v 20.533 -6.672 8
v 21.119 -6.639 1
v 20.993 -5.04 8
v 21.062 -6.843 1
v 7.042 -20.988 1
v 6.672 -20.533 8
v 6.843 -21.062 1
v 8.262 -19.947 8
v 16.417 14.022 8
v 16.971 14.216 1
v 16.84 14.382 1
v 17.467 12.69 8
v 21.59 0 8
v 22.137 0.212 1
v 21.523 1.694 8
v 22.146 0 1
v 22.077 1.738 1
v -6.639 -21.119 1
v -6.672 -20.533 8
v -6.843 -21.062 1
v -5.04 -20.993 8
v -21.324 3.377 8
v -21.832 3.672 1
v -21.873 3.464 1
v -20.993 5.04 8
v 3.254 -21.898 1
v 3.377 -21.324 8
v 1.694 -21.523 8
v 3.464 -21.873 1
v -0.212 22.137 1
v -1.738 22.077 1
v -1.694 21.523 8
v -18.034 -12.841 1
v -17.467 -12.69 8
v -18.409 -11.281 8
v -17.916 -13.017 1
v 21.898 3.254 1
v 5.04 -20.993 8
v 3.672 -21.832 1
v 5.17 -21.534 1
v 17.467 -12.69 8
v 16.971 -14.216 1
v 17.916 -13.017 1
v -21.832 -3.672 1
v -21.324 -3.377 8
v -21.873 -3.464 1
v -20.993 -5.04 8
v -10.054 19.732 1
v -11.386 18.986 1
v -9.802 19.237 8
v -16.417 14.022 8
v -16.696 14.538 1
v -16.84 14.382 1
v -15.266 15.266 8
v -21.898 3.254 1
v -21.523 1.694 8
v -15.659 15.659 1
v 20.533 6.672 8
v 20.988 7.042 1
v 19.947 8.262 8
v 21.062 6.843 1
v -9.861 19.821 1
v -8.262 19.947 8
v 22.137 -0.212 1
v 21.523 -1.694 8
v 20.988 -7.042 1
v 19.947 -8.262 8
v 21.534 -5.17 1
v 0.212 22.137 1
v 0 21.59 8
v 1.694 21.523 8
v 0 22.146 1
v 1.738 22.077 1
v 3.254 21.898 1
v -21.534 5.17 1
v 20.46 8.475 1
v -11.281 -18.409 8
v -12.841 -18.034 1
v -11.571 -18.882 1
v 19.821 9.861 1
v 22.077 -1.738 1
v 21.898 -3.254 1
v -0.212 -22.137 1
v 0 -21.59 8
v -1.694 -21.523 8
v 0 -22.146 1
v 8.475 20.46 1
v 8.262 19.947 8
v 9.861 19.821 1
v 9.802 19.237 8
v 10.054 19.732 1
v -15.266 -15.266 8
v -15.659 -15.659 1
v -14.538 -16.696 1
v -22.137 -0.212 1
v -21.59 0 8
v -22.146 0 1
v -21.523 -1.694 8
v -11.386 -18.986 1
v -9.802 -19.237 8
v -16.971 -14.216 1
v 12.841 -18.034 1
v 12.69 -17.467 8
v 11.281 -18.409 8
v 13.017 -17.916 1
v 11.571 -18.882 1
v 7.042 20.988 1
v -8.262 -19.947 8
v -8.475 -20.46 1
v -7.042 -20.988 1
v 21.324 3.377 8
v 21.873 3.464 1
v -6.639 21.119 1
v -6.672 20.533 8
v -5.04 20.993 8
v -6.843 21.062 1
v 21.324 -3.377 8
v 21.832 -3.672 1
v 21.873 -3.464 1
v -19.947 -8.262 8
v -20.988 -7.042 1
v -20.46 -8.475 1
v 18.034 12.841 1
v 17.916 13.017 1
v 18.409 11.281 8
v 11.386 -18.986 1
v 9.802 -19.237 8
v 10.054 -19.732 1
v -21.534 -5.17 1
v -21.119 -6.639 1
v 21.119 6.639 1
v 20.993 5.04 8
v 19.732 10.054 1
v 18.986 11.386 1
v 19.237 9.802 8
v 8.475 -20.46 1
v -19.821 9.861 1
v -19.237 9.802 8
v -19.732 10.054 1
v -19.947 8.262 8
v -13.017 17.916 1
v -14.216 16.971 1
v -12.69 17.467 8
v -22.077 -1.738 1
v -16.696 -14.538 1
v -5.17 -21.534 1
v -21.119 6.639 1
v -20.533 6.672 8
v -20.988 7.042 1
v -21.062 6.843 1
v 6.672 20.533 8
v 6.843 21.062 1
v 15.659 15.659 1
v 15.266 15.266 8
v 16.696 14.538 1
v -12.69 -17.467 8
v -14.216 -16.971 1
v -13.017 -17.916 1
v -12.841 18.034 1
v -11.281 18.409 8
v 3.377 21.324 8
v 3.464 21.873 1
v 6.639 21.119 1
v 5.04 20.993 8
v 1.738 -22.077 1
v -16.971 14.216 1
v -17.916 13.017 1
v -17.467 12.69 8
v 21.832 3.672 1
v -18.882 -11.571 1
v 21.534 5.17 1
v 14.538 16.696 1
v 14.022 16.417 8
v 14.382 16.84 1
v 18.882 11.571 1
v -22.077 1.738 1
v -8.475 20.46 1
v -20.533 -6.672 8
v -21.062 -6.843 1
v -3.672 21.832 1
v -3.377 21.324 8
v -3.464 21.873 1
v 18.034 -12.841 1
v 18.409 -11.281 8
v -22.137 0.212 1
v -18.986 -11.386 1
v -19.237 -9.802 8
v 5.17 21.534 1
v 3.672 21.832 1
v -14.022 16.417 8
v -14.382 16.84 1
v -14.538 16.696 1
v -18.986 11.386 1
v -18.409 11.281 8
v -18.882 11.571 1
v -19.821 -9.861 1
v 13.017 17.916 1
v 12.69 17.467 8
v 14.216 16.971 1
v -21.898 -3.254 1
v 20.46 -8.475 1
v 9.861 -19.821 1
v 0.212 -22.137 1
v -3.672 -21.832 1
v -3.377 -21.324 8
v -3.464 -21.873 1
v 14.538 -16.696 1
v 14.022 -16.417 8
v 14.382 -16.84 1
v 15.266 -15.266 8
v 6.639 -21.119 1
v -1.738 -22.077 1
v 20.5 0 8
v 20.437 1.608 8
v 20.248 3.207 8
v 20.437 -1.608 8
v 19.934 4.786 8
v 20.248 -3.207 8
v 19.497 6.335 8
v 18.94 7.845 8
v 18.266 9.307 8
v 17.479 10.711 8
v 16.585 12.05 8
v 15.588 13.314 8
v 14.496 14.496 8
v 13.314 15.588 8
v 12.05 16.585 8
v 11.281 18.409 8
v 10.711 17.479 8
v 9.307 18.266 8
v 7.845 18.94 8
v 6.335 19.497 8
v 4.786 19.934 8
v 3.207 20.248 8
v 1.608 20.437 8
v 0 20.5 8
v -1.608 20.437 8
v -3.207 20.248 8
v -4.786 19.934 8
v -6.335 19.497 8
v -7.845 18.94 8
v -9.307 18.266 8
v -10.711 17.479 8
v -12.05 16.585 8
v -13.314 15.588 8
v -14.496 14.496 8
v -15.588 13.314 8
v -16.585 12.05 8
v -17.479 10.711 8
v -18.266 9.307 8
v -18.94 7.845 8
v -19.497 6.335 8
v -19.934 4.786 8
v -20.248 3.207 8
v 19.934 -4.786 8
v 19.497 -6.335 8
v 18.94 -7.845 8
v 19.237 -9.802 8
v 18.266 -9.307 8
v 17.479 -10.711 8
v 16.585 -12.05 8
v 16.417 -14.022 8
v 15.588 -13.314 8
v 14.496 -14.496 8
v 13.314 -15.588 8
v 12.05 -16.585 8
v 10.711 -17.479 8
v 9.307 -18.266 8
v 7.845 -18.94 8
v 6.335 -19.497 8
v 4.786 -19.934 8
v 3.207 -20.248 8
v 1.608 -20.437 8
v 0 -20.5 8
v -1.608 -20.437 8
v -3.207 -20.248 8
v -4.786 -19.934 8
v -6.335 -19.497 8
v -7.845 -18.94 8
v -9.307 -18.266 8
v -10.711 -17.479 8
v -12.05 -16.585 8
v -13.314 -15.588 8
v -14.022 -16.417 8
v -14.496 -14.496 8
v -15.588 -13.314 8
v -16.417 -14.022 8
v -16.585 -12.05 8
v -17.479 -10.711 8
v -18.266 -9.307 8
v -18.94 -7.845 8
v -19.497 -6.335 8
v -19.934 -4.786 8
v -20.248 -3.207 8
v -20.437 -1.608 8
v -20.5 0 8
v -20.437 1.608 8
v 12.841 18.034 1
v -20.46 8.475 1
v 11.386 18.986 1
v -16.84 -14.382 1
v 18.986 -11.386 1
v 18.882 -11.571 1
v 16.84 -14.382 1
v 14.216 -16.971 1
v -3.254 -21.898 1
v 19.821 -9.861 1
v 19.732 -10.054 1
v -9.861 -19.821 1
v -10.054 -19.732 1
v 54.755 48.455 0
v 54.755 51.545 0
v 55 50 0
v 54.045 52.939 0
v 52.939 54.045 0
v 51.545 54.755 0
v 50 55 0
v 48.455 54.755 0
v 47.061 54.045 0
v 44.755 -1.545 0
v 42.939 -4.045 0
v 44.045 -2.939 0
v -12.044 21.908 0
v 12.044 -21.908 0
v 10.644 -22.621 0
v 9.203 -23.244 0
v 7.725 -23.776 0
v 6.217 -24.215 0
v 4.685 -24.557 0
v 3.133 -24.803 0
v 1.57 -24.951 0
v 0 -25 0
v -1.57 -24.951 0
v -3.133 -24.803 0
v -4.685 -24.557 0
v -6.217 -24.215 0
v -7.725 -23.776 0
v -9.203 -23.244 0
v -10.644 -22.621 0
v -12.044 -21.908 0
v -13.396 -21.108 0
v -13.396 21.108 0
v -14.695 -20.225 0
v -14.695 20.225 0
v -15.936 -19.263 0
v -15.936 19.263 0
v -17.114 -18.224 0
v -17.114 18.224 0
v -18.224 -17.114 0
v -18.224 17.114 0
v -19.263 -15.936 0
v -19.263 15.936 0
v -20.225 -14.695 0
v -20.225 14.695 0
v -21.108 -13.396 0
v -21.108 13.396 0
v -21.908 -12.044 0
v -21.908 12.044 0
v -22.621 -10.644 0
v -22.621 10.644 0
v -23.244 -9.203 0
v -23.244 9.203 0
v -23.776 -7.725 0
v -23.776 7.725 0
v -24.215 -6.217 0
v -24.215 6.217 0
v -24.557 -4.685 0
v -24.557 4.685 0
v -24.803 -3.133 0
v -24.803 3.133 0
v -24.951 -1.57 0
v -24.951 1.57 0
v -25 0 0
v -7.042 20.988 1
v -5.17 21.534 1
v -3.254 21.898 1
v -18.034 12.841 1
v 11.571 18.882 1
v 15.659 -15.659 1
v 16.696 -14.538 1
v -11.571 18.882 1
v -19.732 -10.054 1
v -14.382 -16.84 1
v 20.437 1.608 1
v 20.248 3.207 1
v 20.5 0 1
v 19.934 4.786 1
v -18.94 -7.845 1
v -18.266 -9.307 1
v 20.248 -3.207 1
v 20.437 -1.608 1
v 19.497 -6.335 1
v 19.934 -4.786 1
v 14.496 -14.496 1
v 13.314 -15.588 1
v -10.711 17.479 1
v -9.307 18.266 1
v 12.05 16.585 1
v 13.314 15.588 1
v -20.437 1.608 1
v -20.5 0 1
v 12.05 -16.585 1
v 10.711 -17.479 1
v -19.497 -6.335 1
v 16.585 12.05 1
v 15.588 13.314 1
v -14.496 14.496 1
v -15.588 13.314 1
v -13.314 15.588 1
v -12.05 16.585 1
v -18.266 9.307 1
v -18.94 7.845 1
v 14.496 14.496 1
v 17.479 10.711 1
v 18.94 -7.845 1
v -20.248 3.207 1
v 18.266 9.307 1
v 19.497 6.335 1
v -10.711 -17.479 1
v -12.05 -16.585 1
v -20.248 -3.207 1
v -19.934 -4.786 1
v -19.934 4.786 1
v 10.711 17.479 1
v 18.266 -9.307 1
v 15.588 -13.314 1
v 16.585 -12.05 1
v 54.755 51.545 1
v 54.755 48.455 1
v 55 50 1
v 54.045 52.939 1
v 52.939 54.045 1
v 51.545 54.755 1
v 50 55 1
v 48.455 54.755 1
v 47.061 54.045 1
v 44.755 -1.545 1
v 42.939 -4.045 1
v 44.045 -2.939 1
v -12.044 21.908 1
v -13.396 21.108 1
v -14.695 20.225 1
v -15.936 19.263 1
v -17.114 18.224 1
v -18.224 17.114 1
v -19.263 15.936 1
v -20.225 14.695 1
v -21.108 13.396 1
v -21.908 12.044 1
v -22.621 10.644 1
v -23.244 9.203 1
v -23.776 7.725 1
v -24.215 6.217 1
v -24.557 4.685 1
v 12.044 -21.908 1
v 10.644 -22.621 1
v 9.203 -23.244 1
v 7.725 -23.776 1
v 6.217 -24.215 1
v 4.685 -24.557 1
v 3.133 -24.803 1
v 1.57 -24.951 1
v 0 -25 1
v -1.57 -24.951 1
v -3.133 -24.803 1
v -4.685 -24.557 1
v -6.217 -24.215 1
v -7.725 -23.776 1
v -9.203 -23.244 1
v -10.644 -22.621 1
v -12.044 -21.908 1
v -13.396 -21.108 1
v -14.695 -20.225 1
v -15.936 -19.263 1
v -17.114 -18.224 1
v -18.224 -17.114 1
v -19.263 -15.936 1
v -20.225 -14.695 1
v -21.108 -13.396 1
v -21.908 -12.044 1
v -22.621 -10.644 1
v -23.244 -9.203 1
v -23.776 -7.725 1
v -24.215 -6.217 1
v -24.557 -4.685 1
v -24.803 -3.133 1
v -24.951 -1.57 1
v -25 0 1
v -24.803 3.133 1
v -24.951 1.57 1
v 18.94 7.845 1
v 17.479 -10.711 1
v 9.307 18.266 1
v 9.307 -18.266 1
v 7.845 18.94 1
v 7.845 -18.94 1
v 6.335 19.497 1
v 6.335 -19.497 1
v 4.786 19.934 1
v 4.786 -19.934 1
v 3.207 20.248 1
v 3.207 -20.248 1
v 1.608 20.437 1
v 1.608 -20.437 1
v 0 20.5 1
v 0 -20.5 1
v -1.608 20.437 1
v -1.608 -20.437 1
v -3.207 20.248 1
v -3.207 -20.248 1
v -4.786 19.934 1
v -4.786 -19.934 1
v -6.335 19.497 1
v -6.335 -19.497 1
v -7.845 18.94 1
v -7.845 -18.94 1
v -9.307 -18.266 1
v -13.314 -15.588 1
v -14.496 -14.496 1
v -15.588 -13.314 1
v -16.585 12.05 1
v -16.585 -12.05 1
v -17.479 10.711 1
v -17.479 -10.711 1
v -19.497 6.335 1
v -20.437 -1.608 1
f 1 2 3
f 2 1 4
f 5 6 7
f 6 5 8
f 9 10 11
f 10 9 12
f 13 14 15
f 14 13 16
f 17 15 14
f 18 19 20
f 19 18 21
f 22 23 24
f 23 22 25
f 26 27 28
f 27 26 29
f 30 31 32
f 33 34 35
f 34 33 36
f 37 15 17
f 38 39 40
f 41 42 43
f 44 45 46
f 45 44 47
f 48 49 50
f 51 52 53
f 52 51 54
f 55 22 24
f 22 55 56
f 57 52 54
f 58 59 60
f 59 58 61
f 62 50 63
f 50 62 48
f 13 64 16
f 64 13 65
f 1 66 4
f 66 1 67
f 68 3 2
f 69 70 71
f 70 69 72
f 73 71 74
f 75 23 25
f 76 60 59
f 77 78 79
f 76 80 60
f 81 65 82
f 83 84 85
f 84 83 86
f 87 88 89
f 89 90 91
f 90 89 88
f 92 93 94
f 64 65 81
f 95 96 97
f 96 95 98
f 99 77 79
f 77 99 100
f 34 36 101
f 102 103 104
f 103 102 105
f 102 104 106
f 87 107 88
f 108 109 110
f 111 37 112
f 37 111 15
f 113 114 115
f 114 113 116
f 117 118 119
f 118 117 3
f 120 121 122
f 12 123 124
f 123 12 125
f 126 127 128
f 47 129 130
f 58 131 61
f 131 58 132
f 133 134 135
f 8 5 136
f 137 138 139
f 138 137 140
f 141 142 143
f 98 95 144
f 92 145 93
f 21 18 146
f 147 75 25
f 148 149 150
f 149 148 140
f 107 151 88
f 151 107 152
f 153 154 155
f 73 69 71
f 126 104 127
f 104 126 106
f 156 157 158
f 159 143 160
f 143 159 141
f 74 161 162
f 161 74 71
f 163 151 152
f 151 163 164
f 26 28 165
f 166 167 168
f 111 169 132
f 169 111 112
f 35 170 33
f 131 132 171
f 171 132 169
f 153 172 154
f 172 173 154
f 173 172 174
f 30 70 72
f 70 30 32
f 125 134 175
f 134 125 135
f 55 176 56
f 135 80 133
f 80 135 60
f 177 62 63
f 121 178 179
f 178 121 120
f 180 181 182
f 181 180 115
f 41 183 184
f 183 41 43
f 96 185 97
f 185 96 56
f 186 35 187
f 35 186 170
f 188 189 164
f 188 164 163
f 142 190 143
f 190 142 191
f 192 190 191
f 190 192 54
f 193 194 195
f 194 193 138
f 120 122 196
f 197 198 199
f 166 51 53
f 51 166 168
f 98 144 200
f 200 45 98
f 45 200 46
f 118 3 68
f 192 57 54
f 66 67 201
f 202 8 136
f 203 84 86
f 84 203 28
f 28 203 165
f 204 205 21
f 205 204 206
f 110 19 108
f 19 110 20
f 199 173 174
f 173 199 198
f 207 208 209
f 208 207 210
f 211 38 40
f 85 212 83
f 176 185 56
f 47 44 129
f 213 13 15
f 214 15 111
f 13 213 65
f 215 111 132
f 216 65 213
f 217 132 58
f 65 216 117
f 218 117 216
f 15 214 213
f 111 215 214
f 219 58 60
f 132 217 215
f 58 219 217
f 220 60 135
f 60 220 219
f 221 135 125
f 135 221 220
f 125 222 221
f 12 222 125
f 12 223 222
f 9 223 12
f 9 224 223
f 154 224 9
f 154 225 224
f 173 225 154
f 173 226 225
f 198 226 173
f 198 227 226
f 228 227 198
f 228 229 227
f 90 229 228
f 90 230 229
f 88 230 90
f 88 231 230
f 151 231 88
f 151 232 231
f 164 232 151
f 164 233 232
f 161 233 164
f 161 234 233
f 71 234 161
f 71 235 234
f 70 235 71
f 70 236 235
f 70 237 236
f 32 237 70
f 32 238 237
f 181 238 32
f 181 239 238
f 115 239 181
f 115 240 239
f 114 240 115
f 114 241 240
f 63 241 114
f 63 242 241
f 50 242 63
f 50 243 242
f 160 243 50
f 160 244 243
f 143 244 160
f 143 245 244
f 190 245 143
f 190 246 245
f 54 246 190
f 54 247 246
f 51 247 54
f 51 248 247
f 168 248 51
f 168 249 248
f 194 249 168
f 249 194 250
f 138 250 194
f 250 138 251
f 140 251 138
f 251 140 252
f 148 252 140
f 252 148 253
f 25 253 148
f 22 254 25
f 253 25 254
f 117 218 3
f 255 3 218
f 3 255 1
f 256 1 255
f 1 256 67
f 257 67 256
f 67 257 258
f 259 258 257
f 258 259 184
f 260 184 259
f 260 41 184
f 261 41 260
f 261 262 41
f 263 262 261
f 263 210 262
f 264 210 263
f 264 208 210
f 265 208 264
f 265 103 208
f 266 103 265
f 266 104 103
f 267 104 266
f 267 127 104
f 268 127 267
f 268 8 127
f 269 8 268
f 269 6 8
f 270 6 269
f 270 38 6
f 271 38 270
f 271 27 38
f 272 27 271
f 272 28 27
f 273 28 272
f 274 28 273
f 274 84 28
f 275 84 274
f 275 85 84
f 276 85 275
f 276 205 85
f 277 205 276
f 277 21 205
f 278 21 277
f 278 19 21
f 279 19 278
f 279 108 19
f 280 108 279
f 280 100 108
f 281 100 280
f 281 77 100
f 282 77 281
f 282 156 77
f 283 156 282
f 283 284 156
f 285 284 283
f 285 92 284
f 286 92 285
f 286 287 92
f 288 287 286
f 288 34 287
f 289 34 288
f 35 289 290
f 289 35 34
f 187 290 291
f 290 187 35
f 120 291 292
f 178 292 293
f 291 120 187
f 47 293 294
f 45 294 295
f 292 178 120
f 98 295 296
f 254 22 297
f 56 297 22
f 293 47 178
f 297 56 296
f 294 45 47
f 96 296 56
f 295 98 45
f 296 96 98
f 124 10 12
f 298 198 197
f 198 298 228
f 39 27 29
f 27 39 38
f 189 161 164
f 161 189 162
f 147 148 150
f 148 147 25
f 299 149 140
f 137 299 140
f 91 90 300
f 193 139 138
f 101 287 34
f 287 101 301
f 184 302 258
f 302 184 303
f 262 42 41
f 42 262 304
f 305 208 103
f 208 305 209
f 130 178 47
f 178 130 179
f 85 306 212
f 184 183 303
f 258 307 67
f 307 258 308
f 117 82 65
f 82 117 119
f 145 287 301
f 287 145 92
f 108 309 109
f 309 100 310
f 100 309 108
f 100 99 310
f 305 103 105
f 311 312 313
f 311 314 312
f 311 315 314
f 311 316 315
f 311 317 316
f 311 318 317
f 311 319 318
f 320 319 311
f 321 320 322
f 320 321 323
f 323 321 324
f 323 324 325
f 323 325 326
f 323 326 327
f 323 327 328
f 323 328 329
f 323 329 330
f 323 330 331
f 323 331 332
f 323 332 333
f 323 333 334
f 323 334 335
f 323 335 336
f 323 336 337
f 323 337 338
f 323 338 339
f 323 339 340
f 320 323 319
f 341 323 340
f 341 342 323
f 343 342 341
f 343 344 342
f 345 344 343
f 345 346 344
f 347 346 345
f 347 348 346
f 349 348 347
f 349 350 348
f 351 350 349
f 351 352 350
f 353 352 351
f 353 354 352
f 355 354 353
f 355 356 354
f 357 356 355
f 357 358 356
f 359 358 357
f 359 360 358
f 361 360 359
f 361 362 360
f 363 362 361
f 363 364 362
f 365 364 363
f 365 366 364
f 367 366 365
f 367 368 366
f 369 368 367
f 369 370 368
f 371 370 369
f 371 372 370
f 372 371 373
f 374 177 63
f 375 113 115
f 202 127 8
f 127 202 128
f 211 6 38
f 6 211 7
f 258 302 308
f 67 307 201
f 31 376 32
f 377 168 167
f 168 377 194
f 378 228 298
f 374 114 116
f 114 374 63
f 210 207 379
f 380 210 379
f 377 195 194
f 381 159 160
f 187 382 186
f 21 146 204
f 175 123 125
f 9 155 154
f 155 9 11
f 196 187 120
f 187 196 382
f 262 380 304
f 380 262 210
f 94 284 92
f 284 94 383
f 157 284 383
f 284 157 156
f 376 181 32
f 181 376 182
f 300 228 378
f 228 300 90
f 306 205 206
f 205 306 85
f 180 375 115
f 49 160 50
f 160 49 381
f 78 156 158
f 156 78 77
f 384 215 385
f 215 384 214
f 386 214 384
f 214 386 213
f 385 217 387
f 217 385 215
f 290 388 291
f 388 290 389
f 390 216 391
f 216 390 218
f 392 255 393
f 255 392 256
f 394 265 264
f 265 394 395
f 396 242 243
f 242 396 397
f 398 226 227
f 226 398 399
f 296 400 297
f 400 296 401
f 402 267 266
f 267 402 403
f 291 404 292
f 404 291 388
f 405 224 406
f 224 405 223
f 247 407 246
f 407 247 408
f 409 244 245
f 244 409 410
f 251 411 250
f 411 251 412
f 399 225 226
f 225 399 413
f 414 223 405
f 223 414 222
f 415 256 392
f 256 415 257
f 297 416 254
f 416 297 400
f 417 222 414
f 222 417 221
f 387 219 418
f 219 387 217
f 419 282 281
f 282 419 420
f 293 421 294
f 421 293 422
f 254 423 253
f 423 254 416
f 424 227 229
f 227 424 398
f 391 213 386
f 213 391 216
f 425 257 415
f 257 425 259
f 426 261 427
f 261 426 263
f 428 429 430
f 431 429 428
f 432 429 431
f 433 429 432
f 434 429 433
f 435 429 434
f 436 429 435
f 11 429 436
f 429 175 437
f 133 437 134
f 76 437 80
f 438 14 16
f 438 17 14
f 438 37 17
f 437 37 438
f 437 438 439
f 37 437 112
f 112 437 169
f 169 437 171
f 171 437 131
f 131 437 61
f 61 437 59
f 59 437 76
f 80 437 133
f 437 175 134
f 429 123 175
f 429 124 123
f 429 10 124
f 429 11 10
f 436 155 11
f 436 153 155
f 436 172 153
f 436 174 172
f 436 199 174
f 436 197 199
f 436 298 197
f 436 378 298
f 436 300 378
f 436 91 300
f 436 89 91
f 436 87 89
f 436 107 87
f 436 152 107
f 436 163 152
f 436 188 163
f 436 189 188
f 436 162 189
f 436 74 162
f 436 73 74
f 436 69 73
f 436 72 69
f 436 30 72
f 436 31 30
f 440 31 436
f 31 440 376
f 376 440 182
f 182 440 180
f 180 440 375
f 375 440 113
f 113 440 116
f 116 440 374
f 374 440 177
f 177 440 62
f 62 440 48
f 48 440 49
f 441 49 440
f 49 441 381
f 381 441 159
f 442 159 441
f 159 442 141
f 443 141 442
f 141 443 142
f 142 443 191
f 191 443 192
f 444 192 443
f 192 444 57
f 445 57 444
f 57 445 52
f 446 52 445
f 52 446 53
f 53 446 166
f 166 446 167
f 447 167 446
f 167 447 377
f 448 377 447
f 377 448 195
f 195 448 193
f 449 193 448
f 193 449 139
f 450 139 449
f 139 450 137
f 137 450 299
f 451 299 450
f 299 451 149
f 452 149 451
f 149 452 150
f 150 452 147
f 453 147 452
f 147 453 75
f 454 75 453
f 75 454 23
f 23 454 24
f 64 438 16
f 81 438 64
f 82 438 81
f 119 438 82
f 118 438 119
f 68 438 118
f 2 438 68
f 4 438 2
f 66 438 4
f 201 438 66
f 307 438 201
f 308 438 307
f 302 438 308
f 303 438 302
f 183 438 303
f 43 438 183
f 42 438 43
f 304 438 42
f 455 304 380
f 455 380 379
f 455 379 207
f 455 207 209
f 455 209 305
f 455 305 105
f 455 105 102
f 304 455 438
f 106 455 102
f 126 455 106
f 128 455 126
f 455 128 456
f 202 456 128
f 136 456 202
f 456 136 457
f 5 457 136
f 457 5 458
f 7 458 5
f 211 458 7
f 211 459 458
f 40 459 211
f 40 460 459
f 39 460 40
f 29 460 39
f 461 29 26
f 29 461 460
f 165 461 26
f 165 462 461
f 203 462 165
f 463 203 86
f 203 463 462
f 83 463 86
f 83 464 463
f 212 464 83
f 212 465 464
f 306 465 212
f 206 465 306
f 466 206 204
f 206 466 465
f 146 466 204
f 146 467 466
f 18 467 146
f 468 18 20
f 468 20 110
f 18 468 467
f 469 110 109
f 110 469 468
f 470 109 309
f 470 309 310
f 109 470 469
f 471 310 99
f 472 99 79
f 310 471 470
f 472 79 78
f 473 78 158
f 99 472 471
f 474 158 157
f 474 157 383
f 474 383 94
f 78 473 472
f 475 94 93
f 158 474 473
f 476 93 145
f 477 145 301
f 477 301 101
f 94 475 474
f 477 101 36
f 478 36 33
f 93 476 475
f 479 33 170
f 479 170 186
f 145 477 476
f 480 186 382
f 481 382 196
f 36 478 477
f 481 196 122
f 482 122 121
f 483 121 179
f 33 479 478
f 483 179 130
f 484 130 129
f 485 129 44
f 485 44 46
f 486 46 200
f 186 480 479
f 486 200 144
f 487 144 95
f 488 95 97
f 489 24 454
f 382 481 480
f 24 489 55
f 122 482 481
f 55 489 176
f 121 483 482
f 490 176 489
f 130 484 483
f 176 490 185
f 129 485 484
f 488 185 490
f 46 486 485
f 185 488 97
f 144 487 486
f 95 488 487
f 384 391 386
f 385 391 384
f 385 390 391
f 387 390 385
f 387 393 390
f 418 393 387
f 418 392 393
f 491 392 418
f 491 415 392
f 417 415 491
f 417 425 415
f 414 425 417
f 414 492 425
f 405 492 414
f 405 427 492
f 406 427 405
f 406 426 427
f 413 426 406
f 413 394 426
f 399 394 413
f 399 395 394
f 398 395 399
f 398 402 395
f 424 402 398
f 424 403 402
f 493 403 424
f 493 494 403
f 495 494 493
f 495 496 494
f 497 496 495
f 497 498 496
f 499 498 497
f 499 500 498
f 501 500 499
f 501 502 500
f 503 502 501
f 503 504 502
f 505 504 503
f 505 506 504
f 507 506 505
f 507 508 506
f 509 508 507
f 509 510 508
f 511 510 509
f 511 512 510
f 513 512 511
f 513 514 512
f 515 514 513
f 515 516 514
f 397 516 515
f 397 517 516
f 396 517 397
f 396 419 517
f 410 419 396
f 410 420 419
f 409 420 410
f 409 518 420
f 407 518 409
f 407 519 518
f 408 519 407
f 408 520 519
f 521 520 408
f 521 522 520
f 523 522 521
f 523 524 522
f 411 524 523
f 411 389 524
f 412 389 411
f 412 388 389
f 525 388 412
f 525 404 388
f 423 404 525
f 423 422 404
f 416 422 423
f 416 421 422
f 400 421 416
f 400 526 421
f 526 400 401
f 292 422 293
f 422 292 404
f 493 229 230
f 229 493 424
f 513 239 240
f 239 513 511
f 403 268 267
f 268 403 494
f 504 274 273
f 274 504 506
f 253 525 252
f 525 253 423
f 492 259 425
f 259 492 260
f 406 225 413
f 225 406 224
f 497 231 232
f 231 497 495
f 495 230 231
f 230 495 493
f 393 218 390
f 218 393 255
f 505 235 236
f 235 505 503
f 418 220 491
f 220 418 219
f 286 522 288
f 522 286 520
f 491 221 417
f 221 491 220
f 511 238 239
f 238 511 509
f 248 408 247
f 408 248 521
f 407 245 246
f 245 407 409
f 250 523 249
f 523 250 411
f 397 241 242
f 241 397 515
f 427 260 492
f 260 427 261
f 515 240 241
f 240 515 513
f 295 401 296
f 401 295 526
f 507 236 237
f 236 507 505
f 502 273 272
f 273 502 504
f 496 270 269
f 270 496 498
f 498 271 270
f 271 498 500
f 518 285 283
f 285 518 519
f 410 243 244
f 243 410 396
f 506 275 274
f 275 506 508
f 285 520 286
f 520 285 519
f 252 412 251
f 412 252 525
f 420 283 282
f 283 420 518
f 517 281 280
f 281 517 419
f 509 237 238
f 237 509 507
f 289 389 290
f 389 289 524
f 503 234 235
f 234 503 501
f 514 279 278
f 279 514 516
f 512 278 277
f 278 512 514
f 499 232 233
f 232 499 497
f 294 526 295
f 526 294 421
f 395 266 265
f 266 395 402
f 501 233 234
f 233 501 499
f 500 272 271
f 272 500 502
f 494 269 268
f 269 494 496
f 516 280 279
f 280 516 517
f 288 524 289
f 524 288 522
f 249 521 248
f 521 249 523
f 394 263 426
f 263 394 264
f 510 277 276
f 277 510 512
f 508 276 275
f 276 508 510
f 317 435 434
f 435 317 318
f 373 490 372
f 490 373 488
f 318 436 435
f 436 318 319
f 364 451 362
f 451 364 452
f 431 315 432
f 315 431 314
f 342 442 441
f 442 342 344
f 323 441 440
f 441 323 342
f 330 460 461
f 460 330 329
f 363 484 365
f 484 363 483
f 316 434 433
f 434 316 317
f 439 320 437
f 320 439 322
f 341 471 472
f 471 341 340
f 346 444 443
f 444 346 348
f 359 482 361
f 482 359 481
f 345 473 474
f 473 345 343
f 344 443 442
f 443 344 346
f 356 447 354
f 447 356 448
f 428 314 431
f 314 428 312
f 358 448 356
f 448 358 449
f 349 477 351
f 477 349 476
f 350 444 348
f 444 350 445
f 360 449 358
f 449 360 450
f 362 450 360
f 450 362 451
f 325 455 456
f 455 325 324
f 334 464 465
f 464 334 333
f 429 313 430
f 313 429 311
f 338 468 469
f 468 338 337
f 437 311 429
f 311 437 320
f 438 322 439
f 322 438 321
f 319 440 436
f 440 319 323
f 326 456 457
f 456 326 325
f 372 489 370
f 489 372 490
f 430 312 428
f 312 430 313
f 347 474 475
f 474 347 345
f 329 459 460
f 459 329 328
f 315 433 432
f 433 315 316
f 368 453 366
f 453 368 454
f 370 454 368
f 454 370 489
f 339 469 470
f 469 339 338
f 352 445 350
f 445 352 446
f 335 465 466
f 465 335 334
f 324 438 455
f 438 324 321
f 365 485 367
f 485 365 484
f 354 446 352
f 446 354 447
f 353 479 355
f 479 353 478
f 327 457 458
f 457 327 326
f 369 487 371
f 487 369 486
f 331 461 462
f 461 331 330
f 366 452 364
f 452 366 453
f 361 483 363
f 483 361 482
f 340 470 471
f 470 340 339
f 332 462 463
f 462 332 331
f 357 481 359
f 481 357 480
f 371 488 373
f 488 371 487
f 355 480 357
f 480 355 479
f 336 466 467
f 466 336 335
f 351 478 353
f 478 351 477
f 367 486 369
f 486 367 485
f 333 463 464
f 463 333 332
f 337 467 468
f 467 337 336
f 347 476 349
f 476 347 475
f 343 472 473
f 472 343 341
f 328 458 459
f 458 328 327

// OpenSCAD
difference() {
cylinder(d1=1.75*25.4,d2=1.7*25.4,h=8,$fn=80);
  translate([0,0,1]) cylinder(d=41,h=9.01,$fn=80);
}
linear_extrude(1) {
  hull() {
  circle(d=50,h=1,$fn=100);
    translate([50,50]) circle(d=10,$fn=20);
    translate([40,0]) circle(d=10,$fn=20);
  }
}
